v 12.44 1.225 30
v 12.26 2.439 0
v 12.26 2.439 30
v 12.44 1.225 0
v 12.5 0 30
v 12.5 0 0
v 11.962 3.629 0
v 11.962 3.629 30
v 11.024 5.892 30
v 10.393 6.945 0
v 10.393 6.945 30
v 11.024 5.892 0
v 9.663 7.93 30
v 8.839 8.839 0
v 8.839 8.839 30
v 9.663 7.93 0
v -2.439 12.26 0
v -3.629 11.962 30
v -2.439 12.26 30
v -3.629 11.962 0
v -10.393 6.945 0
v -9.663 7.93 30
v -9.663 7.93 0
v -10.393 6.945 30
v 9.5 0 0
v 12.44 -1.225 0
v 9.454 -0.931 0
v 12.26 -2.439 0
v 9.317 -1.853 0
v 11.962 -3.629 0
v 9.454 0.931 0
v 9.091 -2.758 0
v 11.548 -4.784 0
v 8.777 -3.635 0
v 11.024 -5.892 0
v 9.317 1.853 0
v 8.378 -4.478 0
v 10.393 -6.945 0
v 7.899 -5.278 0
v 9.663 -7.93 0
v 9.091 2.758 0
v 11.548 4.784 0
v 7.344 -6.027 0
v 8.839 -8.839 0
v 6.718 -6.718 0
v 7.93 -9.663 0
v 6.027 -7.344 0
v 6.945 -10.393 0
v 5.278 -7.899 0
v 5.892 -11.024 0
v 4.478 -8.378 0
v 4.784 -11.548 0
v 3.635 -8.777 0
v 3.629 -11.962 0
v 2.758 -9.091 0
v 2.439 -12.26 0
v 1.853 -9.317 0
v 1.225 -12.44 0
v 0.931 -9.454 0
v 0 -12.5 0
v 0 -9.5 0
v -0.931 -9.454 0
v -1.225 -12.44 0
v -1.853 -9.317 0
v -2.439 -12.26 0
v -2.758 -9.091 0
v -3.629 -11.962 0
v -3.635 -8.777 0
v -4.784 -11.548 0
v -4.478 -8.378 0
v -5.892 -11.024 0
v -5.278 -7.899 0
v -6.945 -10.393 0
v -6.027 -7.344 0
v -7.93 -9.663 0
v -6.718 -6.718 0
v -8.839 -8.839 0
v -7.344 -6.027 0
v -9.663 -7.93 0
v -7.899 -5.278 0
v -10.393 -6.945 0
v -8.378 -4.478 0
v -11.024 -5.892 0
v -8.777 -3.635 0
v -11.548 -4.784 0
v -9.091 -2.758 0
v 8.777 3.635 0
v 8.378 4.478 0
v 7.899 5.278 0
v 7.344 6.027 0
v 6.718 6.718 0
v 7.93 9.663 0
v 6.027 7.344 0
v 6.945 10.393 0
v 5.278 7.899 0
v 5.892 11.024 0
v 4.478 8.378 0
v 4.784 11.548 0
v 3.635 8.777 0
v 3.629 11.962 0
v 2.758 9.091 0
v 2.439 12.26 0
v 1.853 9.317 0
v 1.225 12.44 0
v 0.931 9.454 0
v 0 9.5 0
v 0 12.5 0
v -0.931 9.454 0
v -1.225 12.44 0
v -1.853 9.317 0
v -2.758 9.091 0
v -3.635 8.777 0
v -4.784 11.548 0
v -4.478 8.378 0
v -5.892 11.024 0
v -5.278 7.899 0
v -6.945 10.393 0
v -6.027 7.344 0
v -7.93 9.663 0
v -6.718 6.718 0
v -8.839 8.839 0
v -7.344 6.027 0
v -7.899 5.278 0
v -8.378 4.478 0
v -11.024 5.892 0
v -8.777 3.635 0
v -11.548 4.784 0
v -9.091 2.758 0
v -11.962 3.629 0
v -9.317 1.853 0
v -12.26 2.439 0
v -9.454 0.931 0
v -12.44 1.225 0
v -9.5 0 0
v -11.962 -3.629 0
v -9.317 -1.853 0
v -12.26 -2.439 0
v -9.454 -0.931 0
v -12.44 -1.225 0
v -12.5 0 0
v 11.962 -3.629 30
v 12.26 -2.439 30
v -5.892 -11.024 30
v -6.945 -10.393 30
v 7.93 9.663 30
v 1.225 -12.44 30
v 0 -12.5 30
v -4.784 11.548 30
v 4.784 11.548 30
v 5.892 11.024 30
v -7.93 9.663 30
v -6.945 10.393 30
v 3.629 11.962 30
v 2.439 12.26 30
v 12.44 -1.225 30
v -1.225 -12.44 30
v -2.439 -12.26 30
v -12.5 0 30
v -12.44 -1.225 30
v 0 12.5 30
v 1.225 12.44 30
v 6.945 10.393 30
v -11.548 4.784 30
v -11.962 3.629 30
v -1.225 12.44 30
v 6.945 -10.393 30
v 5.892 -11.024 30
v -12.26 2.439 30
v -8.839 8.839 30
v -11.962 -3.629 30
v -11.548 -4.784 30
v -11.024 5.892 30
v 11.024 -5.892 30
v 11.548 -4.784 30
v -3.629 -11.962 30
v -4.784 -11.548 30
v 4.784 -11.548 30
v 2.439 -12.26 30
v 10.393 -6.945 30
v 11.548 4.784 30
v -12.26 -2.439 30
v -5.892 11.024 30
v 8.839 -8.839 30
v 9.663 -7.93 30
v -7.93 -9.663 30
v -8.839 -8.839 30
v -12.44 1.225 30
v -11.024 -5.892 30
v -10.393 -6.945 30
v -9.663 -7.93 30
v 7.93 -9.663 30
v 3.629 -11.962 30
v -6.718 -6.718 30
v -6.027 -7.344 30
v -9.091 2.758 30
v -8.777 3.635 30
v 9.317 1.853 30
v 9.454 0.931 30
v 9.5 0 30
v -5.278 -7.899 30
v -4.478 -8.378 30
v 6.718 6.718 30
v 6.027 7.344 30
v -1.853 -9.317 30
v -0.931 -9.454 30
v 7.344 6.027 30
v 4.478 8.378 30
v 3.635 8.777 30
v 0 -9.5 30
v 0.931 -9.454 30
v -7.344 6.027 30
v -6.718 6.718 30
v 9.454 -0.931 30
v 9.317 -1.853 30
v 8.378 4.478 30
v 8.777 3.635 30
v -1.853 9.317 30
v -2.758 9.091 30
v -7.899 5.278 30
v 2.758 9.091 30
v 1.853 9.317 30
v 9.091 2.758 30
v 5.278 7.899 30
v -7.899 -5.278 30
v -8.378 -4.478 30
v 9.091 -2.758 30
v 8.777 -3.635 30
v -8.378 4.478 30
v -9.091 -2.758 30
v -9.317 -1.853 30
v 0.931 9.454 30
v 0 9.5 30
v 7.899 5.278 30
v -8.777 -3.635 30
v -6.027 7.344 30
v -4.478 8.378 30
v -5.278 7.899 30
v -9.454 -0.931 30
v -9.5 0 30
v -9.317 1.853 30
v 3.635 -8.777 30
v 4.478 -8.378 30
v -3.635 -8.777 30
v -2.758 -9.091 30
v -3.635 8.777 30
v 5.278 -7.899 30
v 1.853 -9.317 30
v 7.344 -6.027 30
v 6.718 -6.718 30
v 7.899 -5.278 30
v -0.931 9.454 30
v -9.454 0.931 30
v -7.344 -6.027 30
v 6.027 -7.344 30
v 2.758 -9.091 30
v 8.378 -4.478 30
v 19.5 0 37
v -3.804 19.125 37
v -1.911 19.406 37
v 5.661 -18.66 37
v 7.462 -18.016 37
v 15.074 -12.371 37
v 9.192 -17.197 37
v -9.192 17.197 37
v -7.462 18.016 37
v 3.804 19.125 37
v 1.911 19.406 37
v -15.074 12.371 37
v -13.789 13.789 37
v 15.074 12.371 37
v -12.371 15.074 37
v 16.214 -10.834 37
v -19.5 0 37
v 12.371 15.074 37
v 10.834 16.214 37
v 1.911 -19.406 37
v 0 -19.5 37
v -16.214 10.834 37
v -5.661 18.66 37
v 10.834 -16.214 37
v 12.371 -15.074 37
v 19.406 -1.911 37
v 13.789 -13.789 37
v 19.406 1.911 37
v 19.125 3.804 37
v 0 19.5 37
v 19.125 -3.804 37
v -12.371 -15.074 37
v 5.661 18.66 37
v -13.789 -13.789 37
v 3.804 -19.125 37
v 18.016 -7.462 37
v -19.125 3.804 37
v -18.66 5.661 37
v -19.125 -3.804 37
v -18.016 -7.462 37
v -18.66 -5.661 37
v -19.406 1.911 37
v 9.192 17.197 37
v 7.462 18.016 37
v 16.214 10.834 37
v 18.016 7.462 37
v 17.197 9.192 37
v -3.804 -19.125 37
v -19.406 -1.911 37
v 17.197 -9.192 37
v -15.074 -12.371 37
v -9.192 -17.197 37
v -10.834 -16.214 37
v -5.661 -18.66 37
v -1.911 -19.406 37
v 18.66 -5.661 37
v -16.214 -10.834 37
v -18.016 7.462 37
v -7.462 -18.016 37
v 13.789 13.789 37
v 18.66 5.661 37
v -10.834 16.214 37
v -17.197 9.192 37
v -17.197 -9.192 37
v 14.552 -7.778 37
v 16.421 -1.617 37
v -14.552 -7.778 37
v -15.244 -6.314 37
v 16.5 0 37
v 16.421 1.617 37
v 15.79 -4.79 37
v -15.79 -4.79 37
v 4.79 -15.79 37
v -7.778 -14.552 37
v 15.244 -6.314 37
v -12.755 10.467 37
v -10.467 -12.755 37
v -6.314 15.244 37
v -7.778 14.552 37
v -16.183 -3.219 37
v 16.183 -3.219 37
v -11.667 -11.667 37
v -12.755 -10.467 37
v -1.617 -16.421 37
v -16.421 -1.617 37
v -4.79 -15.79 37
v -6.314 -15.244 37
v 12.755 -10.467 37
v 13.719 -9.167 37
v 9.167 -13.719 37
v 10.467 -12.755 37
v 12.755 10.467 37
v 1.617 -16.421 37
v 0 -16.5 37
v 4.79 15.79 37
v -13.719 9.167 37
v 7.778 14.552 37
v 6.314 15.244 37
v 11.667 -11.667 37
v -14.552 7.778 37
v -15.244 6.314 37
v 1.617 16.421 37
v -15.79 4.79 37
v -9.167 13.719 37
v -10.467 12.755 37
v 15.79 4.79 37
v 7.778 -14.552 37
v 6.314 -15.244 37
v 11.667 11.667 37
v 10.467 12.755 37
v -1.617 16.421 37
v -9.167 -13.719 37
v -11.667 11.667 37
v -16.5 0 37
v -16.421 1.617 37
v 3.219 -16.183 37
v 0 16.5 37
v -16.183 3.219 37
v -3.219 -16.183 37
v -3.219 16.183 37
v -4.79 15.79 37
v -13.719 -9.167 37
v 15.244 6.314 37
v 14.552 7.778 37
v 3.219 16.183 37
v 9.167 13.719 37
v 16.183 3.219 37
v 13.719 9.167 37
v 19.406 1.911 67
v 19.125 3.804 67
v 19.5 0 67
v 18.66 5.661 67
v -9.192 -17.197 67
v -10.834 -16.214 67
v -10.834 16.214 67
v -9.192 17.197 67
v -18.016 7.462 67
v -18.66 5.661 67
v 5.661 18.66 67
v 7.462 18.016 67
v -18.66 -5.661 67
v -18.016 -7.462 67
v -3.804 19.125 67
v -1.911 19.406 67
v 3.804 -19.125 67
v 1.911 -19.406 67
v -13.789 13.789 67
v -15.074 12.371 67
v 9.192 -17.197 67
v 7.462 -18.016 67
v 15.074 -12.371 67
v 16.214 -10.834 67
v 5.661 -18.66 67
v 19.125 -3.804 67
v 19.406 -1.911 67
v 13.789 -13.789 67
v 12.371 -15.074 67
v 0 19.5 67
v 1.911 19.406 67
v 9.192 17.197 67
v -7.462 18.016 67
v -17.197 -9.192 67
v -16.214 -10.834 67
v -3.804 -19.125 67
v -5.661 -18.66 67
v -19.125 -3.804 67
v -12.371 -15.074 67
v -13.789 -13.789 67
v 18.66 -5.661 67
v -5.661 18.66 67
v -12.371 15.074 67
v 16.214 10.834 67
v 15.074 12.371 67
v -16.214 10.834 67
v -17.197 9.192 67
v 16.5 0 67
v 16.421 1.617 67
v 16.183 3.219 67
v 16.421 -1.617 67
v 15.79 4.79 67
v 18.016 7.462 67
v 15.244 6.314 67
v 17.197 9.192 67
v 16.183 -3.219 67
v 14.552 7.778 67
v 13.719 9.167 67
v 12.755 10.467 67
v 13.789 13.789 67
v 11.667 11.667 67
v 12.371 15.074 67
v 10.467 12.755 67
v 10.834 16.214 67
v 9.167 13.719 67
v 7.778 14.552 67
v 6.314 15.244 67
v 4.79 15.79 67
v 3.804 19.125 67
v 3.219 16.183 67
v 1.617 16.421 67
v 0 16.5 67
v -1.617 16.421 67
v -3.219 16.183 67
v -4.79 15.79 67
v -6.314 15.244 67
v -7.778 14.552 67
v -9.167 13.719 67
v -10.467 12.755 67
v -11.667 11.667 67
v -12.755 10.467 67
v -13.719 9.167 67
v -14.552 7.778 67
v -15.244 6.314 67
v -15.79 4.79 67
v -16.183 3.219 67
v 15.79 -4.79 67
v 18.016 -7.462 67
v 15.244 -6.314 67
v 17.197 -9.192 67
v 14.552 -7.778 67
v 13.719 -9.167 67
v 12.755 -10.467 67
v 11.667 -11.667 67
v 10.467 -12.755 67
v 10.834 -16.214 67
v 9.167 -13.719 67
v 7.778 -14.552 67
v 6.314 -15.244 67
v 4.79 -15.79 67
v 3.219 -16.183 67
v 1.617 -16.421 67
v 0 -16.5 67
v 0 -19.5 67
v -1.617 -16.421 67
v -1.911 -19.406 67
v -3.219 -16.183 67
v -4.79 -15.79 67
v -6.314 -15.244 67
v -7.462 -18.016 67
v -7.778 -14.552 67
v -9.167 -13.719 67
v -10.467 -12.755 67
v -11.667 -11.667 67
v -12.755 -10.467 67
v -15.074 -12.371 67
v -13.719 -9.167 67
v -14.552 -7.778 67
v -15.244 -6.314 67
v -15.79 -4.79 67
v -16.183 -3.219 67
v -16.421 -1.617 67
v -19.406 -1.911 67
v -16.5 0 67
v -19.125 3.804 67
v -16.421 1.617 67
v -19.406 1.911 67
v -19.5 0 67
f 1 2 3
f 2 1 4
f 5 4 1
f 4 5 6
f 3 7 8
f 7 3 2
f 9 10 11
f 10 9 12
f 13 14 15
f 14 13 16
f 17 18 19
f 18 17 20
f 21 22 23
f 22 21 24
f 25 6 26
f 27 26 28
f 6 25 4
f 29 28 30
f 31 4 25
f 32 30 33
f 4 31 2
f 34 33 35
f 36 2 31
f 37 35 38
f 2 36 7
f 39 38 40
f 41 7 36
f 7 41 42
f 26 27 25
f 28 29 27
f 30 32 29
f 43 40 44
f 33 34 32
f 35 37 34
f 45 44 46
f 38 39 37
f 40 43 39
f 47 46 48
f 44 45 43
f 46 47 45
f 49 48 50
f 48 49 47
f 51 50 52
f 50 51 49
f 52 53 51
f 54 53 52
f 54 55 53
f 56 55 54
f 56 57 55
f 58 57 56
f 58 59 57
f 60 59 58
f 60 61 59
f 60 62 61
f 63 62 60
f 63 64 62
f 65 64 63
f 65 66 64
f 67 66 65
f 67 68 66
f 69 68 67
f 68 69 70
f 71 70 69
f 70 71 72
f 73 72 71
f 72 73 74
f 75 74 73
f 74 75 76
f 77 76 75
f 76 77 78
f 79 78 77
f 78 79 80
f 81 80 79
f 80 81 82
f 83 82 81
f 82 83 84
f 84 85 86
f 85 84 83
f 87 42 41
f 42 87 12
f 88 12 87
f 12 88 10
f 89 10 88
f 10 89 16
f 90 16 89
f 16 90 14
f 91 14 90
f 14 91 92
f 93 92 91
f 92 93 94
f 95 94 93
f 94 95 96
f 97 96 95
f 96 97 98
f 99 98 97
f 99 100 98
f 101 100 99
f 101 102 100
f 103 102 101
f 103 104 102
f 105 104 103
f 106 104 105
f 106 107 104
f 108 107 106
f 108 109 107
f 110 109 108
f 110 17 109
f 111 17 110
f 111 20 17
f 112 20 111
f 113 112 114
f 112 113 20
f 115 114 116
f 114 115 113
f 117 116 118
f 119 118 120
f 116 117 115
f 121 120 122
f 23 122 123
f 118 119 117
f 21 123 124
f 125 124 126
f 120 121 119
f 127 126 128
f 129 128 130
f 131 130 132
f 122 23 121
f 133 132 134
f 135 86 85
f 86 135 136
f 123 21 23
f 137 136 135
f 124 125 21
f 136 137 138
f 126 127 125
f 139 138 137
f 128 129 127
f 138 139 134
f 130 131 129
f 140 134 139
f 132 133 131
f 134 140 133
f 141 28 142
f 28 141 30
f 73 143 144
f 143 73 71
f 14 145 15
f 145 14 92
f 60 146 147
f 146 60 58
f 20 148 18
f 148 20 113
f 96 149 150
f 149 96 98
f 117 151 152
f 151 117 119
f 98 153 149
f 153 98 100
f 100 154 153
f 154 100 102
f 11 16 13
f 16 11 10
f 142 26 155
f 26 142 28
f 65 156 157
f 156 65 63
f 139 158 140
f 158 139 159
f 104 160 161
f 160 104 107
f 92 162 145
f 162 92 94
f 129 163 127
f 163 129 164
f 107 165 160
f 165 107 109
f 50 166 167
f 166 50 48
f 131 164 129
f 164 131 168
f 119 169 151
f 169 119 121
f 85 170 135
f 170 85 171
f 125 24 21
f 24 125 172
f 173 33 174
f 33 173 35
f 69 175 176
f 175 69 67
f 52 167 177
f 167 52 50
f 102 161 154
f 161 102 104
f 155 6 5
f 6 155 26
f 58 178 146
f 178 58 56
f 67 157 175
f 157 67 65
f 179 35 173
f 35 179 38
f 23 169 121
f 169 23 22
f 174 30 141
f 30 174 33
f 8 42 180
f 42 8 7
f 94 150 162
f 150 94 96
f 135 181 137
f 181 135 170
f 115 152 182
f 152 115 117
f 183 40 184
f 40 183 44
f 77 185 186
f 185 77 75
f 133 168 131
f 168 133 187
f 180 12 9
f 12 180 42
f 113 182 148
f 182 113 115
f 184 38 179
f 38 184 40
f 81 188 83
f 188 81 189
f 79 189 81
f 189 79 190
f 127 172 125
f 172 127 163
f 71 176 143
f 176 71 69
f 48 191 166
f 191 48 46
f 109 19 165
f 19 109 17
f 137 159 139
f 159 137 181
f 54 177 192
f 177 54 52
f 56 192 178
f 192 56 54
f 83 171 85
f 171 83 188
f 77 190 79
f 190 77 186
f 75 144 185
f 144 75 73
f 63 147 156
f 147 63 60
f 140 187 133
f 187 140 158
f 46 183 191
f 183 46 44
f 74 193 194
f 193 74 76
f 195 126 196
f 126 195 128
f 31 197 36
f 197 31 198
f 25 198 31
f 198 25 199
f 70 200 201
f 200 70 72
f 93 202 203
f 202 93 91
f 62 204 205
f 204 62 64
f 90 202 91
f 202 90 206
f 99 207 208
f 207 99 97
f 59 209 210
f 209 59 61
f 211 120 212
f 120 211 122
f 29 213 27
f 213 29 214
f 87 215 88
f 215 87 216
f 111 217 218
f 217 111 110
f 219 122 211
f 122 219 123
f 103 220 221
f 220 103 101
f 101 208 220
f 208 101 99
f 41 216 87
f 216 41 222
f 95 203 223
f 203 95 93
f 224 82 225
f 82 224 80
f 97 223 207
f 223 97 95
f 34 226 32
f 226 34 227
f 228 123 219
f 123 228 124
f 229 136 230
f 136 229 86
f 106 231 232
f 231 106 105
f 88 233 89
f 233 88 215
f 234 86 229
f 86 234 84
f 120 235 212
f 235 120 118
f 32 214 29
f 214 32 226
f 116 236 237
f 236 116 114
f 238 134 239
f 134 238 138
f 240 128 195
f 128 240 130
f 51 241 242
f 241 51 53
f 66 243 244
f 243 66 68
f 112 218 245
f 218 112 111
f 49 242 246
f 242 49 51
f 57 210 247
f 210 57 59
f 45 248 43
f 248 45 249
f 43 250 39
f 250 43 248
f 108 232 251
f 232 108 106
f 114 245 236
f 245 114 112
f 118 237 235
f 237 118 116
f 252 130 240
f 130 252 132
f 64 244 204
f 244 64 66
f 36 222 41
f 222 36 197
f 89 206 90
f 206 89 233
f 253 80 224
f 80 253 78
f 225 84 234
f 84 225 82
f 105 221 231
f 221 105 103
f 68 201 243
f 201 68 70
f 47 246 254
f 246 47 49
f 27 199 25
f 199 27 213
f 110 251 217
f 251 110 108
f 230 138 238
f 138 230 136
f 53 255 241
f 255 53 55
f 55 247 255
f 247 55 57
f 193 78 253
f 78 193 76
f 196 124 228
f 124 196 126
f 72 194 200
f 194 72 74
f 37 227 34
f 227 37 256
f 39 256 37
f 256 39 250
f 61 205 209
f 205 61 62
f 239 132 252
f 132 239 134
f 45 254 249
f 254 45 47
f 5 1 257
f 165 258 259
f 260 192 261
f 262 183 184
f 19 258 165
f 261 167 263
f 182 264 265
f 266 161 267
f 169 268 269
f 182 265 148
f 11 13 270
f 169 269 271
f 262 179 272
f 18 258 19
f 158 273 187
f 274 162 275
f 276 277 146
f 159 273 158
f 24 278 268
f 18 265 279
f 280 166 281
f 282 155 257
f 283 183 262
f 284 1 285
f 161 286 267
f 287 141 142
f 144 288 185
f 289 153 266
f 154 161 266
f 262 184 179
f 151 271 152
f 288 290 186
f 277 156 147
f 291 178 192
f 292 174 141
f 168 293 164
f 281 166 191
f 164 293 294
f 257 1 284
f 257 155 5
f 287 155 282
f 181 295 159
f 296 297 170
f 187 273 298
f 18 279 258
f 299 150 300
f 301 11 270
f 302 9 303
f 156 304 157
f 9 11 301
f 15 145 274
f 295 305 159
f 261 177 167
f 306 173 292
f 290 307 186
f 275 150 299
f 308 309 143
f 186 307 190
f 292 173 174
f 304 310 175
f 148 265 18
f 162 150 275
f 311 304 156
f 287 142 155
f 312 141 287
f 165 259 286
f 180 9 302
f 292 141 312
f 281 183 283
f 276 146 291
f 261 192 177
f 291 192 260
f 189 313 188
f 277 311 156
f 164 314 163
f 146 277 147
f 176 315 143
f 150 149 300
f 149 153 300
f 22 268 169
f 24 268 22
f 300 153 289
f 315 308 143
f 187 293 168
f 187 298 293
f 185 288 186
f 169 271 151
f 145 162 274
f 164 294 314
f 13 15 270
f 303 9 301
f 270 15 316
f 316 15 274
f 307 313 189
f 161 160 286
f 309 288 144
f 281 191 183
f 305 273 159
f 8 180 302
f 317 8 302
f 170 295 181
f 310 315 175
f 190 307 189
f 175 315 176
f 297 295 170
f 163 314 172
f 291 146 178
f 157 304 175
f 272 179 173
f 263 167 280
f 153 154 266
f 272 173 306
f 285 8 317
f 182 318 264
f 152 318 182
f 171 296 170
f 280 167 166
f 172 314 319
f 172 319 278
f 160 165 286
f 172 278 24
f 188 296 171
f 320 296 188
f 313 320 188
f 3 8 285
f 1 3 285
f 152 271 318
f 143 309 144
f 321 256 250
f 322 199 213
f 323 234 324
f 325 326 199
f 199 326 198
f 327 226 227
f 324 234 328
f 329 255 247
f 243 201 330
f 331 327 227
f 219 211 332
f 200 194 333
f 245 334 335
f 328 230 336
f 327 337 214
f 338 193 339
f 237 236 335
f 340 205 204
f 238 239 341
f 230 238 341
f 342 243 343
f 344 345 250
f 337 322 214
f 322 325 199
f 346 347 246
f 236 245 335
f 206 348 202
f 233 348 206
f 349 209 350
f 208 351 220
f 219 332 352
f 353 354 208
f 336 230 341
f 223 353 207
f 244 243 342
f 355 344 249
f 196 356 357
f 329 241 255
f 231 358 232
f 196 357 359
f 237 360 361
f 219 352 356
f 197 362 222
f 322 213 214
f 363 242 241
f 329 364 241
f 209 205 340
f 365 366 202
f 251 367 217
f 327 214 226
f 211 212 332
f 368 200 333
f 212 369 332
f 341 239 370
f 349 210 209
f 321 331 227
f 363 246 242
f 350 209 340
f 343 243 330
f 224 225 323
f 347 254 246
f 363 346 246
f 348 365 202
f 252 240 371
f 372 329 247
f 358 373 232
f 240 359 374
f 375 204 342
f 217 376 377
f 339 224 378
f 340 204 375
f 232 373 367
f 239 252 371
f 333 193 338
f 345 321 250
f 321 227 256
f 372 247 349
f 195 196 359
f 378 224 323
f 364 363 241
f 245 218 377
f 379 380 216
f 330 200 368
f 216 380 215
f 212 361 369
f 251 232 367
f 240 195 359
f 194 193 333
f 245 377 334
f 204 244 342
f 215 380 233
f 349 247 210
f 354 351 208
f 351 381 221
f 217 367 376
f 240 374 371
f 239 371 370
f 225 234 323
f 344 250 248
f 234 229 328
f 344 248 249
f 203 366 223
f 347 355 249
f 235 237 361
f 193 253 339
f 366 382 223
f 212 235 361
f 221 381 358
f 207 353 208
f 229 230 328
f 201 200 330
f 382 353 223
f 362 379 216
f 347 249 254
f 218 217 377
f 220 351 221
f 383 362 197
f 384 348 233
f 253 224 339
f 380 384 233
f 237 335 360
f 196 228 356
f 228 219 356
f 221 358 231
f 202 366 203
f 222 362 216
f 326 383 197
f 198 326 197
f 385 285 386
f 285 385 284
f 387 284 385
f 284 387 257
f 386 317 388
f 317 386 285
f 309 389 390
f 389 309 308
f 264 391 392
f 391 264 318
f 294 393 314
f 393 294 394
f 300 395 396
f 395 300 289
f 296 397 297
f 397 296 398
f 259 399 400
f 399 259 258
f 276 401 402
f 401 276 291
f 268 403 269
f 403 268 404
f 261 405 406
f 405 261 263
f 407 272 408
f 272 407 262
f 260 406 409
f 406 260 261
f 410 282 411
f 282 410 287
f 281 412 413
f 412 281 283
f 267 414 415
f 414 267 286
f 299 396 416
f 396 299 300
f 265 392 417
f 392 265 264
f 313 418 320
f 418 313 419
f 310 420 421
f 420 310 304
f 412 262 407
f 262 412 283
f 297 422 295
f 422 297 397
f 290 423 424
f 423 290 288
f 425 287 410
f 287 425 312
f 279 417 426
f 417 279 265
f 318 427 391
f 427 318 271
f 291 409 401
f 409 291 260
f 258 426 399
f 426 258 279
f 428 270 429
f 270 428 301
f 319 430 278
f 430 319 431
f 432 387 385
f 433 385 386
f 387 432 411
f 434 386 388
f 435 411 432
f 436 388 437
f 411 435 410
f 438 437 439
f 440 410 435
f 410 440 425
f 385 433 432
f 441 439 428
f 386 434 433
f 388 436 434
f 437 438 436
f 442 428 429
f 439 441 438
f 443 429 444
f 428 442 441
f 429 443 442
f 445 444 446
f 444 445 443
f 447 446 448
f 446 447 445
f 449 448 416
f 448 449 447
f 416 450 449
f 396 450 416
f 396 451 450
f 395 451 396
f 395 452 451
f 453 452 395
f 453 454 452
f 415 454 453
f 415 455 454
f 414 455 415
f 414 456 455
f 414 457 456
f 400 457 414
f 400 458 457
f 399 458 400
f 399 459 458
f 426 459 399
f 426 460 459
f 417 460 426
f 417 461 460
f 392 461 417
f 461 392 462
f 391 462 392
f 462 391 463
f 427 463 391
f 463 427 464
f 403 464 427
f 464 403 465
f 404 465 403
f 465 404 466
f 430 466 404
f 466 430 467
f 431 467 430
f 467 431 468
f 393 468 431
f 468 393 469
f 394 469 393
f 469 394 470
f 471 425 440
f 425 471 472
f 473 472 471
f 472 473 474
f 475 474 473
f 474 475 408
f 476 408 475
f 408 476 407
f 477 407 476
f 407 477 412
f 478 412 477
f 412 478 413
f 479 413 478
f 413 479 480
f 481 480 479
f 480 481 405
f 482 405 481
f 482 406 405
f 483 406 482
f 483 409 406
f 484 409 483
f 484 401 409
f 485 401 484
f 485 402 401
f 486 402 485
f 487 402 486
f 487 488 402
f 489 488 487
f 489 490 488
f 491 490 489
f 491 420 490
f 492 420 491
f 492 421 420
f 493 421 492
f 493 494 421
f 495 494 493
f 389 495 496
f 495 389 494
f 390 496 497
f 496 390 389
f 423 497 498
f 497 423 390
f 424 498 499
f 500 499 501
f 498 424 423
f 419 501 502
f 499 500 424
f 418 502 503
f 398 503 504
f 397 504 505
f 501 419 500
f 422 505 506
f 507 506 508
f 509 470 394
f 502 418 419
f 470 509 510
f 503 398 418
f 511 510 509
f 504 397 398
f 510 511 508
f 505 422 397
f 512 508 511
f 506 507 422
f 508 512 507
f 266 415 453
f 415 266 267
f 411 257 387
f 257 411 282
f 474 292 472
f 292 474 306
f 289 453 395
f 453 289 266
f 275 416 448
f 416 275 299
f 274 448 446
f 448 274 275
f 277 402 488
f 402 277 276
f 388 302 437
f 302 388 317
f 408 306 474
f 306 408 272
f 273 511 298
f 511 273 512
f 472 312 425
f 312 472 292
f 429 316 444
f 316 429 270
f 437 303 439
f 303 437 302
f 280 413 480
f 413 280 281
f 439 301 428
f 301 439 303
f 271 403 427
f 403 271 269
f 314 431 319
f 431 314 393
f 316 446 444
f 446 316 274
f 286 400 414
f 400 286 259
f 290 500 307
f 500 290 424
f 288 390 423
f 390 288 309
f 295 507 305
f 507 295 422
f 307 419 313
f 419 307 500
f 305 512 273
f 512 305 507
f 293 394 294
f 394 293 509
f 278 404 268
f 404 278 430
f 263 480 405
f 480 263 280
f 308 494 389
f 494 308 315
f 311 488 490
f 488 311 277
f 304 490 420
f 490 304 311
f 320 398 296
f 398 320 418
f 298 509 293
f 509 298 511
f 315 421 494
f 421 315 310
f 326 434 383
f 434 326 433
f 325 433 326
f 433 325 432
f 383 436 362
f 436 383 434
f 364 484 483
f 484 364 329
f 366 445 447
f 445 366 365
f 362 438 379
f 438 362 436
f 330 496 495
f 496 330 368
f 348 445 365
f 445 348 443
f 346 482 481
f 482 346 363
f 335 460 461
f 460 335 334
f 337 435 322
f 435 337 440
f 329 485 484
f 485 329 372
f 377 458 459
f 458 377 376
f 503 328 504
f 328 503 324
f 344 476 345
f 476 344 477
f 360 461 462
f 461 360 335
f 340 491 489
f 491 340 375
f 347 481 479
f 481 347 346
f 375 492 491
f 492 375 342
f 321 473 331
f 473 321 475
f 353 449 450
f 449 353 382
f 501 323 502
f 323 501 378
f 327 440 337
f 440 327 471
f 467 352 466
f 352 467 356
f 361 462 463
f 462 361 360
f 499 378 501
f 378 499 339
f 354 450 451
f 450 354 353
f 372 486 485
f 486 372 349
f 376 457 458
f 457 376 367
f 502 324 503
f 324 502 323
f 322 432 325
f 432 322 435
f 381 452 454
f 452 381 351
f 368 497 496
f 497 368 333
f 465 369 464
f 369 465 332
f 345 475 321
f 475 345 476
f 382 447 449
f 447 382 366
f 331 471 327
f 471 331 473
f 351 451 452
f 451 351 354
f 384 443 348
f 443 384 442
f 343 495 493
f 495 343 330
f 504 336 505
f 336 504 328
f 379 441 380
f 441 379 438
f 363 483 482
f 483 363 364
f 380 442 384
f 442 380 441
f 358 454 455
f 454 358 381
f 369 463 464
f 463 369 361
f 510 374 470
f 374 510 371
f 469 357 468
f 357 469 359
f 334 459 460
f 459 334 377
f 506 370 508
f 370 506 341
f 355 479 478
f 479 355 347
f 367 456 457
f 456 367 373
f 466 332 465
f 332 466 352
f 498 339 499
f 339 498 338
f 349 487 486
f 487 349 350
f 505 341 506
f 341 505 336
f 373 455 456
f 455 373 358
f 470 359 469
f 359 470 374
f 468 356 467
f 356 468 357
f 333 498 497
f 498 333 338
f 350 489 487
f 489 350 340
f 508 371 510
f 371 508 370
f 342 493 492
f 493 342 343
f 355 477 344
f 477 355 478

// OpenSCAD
$fn=$preview ? 16 : 64;

ID1 = 0;
OD1 = 25;
L1 = 30;

ID2 = 33;
OD2 = 0;
L2 = 30;

T = 3;
JL = 0;

assert(ID1 > 0 || OD1 > T, "Atleast one of ID1 or OD1 must be assigned and positive.");
assert(ID2 > 0 || OD2 > T, "Atleast one of ID2 or OD2 must be assigned and positive.");

id1 = ID1 > 0 ? ID1 : OD1 - 2 * T;
od1 = OD1 > 0 ? OD1 : ID1 + 2 * T;

id2 = ID2 > 0 ? ID2 : OD2 - 2 * T;
od2 = OD2 > 0 ? OD2 : ID2 + 2 * T;

jl = JL > 0 ? JL : max(od2-od1, id2-id1)/2;

echo (id1, od1, id2, od2, jl);

difference() {
        cylinder(d=od1, h=L1);
        cylinder(d=id1, h=L1);
}

translate([0,0,L1])
difference() {
        cylinder(d1=od1, d2=od2, h=jl);
        cylinder(d1=id1, d2=id2, h=jl);
}

translate([0,0,L1+jl])
difference() {
        cylinder(d=od2, h=L2);
        cylinder(d=id2, h=L2);

}
